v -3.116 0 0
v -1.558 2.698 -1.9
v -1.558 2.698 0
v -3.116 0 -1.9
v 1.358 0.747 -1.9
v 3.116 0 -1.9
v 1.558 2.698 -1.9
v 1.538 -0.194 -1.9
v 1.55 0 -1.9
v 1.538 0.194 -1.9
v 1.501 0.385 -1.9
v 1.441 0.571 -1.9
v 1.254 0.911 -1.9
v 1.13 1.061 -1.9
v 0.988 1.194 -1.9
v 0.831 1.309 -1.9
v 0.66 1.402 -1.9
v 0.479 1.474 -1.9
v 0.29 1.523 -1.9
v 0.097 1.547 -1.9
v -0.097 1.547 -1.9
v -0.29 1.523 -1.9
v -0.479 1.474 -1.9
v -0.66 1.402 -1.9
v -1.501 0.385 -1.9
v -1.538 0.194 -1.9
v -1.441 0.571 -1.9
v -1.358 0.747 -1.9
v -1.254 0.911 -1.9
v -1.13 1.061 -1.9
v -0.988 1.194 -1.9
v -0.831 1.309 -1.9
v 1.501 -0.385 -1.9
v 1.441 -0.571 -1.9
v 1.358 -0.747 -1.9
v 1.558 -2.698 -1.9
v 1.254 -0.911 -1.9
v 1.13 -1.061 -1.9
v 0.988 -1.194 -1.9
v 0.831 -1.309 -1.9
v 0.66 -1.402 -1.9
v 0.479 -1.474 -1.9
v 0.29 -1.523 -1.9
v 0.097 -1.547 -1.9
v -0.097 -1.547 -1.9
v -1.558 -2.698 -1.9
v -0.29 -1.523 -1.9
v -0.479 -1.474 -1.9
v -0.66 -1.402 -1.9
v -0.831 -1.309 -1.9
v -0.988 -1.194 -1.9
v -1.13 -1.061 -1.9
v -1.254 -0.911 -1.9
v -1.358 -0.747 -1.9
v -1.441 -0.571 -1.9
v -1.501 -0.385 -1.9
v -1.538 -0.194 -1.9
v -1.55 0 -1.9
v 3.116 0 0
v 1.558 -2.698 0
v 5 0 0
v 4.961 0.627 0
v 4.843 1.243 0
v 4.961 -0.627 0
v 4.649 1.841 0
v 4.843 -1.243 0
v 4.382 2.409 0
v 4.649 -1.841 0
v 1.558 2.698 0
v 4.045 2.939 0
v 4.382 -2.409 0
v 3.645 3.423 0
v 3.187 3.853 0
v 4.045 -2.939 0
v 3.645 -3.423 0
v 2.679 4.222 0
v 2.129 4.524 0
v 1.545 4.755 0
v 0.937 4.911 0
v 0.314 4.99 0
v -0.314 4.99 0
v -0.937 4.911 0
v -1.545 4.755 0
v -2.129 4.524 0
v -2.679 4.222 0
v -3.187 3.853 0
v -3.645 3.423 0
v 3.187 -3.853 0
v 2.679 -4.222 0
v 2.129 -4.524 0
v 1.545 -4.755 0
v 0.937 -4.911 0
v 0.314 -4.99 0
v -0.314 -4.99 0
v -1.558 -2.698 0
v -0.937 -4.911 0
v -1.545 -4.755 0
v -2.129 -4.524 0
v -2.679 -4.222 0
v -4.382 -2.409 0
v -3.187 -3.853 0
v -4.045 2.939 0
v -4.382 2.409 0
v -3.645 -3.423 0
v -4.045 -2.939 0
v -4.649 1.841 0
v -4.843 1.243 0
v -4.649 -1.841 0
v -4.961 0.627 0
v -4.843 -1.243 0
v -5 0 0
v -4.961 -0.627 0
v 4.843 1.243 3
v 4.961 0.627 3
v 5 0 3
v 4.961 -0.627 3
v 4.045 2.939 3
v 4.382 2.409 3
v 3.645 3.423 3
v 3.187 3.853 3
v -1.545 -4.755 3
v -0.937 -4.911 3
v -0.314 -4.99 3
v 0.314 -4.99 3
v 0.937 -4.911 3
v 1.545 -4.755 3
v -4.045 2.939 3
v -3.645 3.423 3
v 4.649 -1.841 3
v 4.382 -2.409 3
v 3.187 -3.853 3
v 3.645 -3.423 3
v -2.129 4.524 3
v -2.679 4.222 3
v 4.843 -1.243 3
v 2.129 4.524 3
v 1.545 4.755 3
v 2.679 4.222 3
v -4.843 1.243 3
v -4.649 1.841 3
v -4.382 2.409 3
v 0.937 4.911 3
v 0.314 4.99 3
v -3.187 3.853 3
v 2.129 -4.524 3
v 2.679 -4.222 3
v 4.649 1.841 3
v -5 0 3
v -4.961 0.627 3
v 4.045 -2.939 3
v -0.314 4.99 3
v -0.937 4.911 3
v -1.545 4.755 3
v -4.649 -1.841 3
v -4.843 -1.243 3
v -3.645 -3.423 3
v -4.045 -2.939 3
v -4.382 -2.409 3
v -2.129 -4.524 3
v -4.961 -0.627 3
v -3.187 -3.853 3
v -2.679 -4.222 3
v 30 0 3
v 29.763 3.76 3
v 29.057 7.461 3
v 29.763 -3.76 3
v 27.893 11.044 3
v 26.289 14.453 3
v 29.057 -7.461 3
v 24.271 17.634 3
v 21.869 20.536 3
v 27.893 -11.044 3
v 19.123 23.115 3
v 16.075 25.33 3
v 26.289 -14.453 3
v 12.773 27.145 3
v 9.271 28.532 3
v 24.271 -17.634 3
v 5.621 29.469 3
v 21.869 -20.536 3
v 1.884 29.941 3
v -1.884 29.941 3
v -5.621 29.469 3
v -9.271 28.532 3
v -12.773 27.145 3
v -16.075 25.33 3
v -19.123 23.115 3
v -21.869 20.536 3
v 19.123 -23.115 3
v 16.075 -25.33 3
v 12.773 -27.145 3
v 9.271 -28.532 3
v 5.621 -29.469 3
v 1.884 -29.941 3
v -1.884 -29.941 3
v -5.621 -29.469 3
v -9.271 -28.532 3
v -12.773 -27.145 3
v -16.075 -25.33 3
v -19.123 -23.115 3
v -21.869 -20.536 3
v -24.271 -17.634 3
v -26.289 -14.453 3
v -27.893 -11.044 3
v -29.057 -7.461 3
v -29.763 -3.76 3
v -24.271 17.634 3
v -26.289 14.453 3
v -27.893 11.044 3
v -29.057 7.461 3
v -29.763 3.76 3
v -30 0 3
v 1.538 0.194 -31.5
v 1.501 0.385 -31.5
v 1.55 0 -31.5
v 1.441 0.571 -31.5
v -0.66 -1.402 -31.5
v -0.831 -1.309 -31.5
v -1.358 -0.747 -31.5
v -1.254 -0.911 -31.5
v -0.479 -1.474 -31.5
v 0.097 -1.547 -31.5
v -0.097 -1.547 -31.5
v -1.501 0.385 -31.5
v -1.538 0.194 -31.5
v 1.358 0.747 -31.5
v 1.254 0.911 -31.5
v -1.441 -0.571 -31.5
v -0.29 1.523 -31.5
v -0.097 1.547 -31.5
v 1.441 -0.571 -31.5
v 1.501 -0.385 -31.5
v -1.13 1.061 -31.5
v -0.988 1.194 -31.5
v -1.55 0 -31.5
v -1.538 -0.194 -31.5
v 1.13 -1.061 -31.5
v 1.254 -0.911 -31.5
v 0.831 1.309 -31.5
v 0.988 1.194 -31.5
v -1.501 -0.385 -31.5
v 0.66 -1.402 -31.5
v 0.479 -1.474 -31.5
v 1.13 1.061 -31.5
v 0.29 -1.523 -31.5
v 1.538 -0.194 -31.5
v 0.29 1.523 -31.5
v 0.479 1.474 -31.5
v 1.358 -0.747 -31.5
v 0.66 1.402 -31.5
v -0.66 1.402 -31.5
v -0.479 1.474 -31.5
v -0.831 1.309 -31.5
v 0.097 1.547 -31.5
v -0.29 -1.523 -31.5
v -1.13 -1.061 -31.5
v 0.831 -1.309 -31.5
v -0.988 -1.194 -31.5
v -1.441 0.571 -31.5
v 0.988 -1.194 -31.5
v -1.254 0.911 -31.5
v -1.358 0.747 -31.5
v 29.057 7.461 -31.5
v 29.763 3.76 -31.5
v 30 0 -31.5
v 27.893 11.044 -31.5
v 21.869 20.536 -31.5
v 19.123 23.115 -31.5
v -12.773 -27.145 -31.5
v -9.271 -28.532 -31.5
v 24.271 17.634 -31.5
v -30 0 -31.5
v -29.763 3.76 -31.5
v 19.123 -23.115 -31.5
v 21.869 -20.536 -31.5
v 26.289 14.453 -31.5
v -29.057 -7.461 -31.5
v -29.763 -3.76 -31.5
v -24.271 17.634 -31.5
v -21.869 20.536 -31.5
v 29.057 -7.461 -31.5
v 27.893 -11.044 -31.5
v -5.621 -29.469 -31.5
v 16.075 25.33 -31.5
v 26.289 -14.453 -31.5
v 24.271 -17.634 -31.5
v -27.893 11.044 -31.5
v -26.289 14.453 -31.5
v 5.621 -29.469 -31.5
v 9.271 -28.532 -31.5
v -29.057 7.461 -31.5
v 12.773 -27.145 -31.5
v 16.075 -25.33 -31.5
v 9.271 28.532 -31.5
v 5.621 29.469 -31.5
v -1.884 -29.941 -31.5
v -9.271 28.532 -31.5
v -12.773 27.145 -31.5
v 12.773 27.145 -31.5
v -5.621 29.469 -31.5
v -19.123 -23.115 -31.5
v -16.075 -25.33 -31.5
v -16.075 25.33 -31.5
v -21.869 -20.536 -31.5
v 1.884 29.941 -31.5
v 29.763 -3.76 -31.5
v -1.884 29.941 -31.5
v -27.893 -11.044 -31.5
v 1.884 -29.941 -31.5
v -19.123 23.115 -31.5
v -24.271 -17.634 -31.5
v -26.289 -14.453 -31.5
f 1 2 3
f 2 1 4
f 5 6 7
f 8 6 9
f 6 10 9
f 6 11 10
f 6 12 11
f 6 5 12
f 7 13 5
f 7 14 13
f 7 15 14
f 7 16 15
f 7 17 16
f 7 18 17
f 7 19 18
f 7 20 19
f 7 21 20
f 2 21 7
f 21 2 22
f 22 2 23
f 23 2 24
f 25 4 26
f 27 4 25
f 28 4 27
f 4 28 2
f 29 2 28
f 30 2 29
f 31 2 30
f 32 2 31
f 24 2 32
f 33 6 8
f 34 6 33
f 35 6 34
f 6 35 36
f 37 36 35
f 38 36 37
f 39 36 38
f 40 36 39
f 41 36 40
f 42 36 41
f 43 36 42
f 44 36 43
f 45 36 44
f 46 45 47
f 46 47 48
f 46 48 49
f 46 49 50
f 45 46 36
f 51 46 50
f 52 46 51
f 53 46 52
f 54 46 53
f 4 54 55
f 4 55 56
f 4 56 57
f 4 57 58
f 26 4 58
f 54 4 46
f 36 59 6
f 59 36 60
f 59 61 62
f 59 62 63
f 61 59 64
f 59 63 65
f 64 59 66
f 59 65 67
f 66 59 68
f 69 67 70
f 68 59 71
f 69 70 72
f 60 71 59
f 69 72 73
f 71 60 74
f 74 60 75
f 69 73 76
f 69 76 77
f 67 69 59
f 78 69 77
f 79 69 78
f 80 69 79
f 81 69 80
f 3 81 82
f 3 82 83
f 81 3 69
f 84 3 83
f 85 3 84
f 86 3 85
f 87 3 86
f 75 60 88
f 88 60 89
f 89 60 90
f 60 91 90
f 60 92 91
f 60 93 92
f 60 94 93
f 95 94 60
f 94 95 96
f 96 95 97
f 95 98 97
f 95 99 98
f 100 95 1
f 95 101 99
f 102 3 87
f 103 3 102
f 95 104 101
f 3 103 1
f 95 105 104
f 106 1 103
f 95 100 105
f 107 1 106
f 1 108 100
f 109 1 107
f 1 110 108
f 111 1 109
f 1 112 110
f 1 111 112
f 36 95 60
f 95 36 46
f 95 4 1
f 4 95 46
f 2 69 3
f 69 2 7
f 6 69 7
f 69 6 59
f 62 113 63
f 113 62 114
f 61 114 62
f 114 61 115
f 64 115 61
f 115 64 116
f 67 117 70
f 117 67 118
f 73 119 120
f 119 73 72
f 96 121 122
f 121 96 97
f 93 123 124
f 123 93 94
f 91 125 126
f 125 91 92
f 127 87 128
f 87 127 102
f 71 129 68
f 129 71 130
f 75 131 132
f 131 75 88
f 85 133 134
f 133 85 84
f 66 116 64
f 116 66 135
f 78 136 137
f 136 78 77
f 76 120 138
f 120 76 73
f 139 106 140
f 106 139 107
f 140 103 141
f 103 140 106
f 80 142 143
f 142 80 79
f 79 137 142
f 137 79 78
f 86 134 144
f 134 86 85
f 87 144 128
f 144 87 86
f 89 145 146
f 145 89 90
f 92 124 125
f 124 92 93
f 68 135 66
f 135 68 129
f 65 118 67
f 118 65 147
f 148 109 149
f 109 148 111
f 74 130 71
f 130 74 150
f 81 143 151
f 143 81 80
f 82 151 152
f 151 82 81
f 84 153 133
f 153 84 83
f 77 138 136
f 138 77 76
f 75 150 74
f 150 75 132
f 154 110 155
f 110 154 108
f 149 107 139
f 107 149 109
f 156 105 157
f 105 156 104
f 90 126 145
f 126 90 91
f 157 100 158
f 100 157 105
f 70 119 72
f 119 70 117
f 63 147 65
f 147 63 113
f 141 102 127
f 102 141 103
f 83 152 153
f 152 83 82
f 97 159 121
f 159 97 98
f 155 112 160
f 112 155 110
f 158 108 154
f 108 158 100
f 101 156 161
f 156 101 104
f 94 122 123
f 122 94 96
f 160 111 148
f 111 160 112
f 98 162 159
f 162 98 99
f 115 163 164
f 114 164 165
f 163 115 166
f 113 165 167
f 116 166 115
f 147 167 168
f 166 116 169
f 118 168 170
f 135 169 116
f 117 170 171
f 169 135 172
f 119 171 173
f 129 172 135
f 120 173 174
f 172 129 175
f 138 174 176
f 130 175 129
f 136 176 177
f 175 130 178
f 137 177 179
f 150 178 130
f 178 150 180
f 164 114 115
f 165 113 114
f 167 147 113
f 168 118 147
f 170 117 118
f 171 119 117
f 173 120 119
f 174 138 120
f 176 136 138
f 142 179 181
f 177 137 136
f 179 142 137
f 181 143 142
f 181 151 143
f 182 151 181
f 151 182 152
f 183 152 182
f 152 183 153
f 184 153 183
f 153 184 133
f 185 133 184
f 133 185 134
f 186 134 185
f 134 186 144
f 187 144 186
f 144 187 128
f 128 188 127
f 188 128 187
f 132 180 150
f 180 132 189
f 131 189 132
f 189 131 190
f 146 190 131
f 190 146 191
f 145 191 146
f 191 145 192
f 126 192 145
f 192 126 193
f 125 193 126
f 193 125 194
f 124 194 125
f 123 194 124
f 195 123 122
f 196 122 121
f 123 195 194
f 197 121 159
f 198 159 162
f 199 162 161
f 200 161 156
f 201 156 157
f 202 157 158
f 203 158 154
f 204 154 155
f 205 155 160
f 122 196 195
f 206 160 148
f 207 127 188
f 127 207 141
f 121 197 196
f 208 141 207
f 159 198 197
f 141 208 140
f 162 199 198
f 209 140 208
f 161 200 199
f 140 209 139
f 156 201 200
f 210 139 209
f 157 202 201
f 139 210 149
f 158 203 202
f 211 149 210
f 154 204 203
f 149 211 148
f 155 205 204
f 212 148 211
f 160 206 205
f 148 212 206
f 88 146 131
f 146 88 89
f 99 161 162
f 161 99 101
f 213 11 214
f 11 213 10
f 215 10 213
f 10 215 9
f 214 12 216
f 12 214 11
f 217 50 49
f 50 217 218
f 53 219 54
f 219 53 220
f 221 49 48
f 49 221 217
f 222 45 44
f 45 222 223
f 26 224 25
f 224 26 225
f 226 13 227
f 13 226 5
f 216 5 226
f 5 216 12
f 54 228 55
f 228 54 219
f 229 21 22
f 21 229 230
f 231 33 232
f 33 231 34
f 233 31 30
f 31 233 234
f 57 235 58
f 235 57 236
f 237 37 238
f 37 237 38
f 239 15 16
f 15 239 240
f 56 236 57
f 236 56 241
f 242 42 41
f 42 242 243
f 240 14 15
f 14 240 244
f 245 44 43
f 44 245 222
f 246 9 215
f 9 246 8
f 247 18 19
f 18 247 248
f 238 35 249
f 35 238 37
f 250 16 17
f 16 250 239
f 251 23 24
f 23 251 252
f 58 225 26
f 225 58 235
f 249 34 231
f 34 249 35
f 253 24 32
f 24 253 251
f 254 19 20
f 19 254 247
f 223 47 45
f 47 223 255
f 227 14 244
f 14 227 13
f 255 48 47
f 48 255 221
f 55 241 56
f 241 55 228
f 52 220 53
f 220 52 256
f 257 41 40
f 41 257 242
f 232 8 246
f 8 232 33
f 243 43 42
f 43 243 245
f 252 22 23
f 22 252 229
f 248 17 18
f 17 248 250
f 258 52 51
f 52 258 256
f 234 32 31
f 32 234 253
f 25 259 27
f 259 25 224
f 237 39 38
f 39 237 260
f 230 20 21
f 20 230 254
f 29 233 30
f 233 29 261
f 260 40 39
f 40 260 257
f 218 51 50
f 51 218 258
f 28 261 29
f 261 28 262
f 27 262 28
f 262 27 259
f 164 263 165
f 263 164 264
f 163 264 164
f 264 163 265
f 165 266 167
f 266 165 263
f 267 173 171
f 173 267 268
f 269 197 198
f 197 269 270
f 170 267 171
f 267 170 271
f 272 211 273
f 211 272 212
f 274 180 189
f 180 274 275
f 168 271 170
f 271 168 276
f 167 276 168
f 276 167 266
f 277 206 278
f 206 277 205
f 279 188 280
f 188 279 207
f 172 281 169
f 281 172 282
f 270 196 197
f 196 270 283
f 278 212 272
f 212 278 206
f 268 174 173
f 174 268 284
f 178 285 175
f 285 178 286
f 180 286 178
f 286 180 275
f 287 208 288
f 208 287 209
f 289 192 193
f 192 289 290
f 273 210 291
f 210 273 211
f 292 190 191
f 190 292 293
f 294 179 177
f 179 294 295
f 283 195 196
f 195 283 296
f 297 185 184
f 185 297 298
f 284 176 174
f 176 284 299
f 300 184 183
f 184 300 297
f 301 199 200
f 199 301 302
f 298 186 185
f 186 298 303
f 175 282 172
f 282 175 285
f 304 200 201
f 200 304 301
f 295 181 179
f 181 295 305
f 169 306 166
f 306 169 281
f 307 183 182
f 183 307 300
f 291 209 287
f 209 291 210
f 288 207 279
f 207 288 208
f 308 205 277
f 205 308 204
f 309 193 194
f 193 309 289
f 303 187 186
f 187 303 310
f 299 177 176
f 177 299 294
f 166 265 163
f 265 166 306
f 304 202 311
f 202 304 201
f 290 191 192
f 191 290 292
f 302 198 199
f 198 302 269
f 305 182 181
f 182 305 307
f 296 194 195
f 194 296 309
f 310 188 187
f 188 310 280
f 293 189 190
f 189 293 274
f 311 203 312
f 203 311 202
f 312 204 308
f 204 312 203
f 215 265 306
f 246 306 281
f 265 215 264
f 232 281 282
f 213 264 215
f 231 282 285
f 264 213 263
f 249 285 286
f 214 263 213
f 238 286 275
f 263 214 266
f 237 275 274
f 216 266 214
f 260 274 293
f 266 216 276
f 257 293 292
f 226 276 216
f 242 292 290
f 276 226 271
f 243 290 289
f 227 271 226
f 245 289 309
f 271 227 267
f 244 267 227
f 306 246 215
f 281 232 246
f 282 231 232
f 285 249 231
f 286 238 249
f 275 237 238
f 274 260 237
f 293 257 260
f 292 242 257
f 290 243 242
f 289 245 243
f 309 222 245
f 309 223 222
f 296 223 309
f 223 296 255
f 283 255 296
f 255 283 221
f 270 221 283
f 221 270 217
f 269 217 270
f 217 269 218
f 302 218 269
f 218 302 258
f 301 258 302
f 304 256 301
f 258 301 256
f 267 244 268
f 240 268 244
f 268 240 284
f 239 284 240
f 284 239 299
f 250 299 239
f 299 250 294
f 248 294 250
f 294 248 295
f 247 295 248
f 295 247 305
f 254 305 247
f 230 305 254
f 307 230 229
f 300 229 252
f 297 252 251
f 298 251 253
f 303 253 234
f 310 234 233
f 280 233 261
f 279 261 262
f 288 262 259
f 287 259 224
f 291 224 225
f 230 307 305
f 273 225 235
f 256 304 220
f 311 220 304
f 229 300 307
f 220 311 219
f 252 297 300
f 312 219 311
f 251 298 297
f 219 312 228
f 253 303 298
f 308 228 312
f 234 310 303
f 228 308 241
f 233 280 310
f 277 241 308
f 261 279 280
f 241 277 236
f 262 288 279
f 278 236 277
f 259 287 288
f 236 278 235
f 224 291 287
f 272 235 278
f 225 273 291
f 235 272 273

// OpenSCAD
$fn = 50;

difference() {
	union() {
		translate(v = [0, 0, -31.5]) {
			cylinder(h = 34.5, r = 30.0);
		}
	}
	union() {
		translate(v = [0, 0, 0]) {
			rotate(a = [0, 0, 0]) {
				difference() {
					union() {
						translate(v = [0, 0, -1.9]) {
							linear_extrude(height = 1.9) {
								polygon(points = [[3.1158, 0.0], [1.5579000000000005, 2.698361953111554], [-1.5578999999999994, 2.6983619531115544], [-3.1158, 3.815754496783323e-16], [-1.5579000000000014, -2.6983619531115535], [1.557899999999998, -2.6983619531115552]]);
							}
						}
					}
					union();
				}
			}
		}
		#cylinder(h = 3, r = 5.0);
		#translate(v = [0, 0, -100.0]) {
			cylinder(h = 200, r = 1.55);
		}
	}
}
